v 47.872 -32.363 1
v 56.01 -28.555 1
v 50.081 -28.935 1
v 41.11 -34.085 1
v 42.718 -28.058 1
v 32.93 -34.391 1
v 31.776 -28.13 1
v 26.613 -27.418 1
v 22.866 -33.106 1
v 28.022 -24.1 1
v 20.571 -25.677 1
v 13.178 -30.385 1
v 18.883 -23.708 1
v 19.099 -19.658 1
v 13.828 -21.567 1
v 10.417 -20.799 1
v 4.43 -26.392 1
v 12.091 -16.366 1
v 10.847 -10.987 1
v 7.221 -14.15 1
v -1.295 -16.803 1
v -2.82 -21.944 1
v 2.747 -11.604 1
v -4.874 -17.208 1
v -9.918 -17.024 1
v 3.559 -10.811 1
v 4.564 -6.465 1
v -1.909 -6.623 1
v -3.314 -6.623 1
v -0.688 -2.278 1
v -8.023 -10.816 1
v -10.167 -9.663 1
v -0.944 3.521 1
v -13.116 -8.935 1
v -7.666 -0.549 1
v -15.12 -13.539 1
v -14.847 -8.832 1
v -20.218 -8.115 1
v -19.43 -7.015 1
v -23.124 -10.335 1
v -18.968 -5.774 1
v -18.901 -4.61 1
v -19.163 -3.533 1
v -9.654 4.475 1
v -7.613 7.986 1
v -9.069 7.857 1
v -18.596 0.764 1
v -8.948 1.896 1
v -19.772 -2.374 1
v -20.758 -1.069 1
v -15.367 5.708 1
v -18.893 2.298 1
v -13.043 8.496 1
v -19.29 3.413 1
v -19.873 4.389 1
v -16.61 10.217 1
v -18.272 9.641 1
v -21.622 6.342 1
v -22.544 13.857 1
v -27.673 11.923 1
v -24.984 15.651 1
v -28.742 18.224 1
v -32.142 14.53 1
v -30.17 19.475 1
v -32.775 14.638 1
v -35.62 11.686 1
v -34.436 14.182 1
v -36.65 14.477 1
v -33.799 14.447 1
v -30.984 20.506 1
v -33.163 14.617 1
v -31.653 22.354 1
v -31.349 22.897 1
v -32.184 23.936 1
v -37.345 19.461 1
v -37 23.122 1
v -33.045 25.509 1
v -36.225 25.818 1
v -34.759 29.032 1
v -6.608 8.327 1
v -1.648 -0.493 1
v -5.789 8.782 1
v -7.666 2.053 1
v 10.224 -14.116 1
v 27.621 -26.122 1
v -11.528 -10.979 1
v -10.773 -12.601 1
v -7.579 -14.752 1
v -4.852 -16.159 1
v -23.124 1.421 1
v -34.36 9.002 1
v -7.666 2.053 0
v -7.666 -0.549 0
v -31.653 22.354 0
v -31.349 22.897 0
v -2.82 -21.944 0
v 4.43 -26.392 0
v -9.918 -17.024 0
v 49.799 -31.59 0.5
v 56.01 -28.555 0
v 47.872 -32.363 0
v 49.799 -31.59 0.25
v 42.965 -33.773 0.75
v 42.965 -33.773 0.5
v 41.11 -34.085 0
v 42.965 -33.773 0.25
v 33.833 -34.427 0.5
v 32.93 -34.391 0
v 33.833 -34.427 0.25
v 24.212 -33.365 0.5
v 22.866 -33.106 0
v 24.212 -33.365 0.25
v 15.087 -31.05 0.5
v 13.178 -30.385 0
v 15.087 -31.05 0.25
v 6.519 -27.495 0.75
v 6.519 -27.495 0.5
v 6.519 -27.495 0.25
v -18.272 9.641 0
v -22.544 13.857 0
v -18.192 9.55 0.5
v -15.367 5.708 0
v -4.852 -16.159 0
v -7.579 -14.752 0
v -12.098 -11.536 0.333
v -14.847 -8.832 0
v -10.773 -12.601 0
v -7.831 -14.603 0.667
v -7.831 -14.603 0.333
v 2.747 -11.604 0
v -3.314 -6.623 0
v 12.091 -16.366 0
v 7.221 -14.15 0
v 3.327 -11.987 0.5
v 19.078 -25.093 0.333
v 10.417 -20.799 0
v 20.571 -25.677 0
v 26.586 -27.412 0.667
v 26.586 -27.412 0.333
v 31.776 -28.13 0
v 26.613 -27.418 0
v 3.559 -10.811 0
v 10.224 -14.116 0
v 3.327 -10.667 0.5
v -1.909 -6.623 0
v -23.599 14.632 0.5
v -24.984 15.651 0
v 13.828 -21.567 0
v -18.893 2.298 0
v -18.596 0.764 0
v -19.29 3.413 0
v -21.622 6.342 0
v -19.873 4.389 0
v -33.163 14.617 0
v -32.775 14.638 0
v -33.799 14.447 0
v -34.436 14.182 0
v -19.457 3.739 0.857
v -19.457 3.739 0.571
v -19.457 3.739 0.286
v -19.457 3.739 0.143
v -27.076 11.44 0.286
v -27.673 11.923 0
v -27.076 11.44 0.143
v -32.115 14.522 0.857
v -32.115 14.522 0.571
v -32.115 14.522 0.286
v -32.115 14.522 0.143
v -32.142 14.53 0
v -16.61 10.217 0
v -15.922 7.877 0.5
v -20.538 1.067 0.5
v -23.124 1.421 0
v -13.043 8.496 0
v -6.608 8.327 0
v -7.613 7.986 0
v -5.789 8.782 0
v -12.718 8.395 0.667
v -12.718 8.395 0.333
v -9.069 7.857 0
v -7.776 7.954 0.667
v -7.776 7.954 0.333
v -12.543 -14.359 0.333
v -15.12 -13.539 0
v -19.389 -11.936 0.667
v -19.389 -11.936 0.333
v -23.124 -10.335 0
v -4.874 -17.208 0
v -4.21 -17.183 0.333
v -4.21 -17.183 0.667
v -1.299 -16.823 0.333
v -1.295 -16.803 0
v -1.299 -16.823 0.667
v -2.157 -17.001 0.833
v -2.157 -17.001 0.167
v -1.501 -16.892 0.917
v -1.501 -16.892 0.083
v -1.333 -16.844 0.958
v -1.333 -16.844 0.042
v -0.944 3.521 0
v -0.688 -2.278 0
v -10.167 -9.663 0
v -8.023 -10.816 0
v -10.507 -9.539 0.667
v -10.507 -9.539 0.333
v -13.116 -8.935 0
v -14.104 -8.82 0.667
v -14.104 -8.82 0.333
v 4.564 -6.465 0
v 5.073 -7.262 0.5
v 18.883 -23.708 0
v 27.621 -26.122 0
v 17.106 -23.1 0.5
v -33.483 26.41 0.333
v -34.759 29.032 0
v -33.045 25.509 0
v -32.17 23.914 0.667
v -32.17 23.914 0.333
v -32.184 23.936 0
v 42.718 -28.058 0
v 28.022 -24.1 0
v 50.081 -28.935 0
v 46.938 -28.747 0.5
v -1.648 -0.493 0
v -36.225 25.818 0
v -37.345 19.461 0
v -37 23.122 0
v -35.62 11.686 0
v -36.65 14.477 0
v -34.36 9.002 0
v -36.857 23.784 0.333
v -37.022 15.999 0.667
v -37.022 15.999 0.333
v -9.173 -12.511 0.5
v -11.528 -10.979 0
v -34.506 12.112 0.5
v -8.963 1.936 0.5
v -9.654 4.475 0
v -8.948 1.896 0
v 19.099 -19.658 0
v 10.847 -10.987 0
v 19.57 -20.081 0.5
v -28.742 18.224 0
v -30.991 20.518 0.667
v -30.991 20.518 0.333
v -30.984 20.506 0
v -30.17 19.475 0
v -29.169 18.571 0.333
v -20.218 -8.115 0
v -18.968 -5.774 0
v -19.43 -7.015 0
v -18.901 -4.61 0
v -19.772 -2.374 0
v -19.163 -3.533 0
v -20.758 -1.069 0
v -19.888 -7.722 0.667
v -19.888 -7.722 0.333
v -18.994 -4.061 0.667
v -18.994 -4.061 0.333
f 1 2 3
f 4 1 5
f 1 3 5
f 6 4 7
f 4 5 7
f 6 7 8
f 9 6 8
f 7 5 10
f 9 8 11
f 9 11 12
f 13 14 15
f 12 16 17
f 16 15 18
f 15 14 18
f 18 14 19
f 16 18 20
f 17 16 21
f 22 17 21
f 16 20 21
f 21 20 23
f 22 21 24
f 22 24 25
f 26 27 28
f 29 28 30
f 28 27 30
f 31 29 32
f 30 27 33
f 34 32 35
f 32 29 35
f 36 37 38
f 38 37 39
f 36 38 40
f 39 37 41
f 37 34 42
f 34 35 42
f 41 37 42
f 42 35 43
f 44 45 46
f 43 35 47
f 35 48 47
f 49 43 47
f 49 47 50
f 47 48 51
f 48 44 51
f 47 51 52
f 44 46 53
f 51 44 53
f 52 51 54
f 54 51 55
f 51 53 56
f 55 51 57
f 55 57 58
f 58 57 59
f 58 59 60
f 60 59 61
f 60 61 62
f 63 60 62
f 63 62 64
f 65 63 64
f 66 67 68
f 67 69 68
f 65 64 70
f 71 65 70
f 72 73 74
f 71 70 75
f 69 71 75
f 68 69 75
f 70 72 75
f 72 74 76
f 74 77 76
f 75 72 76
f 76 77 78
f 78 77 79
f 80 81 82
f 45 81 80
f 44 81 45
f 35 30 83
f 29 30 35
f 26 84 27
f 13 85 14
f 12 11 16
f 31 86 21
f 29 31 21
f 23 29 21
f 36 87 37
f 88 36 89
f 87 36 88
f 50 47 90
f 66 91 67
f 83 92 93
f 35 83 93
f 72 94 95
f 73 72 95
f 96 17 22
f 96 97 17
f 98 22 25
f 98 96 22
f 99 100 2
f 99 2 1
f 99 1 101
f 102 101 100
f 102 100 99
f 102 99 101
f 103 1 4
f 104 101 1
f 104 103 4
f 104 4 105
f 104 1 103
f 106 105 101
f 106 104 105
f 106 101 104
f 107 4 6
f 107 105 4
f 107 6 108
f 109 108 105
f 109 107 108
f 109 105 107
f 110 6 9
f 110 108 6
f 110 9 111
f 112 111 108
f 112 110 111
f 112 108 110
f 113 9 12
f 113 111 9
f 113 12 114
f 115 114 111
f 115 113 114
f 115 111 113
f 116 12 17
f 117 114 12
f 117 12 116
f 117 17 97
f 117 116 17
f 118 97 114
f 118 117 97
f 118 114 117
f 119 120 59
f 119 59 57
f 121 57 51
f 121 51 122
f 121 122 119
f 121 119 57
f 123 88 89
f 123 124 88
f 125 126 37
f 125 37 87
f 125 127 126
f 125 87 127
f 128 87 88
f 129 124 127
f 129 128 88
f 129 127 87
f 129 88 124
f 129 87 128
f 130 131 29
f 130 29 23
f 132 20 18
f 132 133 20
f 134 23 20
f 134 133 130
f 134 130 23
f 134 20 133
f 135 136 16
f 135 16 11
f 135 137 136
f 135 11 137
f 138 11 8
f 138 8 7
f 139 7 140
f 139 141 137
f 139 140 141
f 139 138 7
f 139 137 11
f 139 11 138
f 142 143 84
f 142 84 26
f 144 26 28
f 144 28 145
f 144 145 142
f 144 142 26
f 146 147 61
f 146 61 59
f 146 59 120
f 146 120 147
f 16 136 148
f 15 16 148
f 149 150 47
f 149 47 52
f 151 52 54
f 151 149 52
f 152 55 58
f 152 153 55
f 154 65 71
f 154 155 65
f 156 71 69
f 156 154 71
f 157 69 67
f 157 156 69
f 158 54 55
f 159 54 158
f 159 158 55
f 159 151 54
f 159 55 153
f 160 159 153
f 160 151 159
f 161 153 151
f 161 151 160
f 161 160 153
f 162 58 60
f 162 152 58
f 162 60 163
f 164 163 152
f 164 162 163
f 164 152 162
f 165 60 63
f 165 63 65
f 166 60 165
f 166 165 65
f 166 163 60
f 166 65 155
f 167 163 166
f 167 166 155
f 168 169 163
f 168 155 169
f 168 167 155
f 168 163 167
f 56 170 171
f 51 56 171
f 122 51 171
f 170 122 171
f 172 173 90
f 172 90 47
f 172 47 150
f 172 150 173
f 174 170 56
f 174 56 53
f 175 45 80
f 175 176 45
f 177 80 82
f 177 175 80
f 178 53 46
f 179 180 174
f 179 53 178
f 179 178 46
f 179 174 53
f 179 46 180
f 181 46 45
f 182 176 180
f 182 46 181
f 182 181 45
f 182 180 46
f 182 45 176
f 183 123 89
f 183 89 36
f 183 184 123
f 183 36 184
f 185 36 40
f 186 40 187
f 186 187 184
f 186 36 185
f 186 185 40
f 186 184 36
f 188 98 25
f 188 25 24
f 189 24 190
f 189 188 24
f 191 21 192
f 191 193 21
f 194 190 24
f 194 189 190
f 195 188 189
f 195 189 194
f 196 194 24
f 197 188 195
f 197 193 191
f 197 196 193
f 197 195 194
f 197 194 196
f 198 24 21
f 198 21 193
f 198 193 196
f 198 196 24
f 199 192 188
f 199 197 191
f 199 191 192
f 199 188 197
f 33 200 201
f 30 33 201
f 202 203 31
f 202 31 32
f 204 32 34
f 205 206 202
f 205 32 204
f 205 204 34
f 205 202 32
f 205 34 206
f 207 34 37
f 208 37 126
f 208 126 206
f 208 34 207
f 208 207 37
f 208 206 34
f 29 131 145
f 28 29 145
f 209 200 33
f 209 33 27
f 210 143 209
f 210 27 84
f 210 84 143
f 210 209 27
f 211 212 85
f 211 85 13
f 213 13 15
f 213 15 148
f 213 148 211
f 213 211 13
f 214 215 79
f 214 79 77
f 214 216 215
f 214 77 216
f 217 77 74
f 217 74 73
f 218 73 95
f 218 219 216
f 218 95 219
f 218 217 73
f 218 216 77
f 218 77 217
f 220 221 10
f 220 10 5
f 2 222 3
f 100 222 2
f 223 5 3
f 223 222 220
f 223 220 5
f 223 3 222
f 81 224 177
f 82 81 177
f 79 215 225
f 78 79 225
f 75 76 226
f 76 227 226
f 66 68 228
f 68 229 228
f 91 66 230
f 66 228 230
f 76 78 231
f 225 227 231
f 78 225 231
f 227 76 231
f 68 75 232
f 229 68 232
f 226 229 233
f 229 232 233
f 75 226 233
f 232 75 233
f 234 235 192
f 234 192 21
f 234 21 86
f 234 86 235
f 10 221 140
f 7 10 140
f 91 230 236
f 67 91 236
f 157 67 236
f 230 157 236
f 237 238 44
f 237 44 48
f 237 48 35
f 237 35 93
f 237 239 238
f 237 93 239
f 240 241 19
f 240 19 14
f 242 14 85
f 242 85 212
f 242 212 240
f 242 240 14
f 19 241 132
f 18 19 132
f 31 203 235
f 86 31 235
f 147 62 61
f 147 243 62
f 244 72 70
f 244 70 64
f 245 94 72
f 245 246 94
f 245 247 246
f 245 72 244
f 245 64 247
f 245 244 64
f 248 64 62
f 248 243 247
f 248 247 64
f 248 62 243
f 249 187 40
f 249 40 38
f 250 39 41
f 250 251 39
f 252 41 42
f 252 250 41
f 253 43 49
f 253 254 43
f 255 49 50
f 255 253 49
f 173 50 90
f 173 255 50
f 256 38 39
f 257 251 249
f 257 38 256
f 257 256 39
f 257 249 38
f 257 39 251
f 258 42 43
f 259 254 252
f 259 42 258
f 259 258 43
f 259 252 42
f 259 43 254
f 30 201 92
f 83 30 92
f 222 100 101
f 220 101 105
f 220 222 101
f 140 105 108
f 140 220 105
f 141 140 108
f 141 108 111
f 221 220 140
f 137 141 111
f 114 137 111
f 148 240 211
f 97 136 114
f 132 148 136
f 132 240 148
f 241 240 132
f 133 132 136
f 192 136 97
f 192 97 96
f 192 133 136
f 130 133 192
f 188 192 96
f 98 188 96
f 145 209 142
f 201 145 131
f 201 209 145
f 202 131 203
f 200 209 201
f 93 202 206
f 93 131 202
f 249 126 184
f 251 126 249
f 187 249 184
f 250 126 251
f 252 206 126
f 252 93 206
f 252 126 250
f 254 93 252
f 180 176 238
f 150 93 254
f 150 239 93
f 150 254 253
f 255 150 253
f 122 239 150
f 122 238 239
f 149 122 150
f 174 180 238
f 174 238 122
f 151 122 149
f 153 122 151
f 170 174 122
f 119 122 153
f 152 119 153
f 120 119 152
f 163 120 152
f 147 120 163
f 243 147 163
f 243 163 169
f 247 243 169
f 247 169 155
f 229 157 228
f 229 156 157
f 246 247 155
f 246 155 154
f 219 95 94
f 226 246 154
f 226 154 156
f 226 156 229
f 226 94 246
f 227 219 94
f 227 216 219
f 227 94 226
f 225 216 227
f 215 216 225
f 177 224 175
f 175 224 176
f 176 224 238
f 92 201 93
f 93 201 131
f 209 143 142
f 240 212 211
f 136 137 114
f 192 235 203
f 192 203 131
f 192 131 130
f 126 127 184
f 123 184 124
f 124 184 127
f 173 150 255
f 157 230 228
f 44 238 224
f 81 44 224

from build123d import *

# Parameters (mm, degrees)
F1_DEPTH = 1


# Not quite as in the source:
# - a feature names something its author has since deleted; it is built from what else it names


with BuildPart() as f1:
    # F0 (on Top) → F1 (new body)
    with BuildSketch(Plane.XY):
        with BuildLine():
            add(Edge.make_bspline(
                [(-16.6099965572, 10.2172633633), (-15.4212118205, 9.5285409053), (-12.9551826674, 8.0998468723), (-7.766656534, 7.5933629956), (-6.3511176621, 8.4439850217), (-5.7889274321, 8.7818149477)],
                knots=[0, 0, 0, 0, 0.3594226743, 0.7455906573, 1, 1, 1, 1], degree=3))
            add(Edge.make_bspline(
                [(-16.6099965572, 10.2172633633), (-16.3713958805, 9.4307097449), (-15.904194945, 7.8905691575), (-15.5435341339, 6.4249386215), (-15.3670636937, 5.7078092359)],
                knots=[0, 0, 0, 0, 0.5107024806, 1, 1, 1, 1], degree=3))
            add(Edge.make_bspline(
                [(-22.5439389952, 13.8567826848), (-20.9328268461, 12.3755889493), (-17.8750260099, 9.497072632), (-16.1981091624, 6.9589873468), (-15.3670636937, 5.7078092359)],
                knots=[0.1092468408, 0.1092468408, 0.1092468408, 0.1092468408, 0.5599397099, 1, 1, 1, 1], degree=3))
            add(Edge.make_bspline(
                [(-24.9835465397, 15.6512659715), (-24.5105414607, 15.2932659882), (-23.6115055046, 14.644329683), (-22.8821580713, 14.1081462449), (-22.5439389952, 13.8567826848)],
                knots=[0, 0, 0, 0, 0.5340013105, 1, 1, 1, 1], degree=3))
            add(Edge.make_bspline(
                [(-31.6534787416, 22.3535578698), (-31.4894436188, 21.7239753561), (-31.1336922454, 20.3585675093), (-29.1441485457, 18.4393483759), (-26.688509429, 16.66011353), (-24.9835465397, 15.6512659715)],
                knots=[0, 0, 0, 0, 0.1581489893, 0.342985814, 0.5895394489, 0.5895394489, 0.5895394489, 0.5895394489], degree=3))
            Line((-31.6534787416, 22.3535578698), (-31.3492268324, 22.8967126459))
            add(Edge.make_bspline(
                [(-34.7586423159, 29.0321223438), (-34.3418990536, 28.1776650529), (-33.5153831208, 26.4830424187), (-32.2770591236, 23.9047003589), (-31.6167279276, 23.1873231579), (-31.3492268324, 22.8967126459)],
                knots=[0, 0, 0, 0, 0.3769541602, 0.747603255, 1, 1, 1, 1], degree=3))
            add(Edge.make_bspline(
                [(-34.7586423159, 29.0321223438), (-35.5677944518, 27.4079633385), (-37.3288786405, 23.8782557478), (-37.627728367, 15.760880925), (-35.454224769, 11.2387606607), (-34.3599178116, 9.002301842)],
                knots=[0, 0, 0, 0, 0.3007790413, 0.6538294353, 1, 1, 1, 1], degree=3))
            add(Edge.make_bspline(
                [(-34.3599178116, 9.002301842), (-34.4460411955, 10.0396901503), (-34.5463298451, 11.768741471), (-34.4792390008, 13.4920788706), (-34.4357995181, 14.1820461029)],
                knots=[0, 0, 0, 0, 0.5004169403, 0.8340605609, 0.8340605609, 0.8340605609, 0.8340605609], degree=3))
            add(Edge.make_bspline(
                [(-18.5956805944, 0.7639901596), (-18.754914474, 1.762296212), (-19.1182465354, 4.0401820297), (-22.8890828074, 7.5134991963), (-26.9671489576, 11.505197563), (-29.4215545254, 13.182958406), (-32.0236221513, 14.6651885876), (-33.3319524476, 14.6676349212), (-34.0719301846, 14.3425994686), (-34.4357995181, 14.1820461029)],
                knots=[0, 0, 0, 0, 0.1460617246, 0.3332764838, 0.5324015784, 0.6782952182, 0.8179917645, 0.9100820113, 0.9991741954, 0.9991741954, 0.9991741954, 0.9991741954], degree=3))
            add(Edge.make_bspline(
                [(-23.1238305569, 1.4212612296), (-22.2308115866, 1.302547656), (-20.5628255796, 1.0808137554), (-19.2197091749, 0.8644946878), (-18.5956805944, 0.7639901596)],
                knots=[0, 0, 0, 0, 0.5353875671, 1, 1, 1, 1], degree=3))
            add(Edge.make_bspline(
                [(-23.1238305569, -10.3354090825), (-21.9181343668, -9.5672404628), (-19.5647077627, -8.0678341604), (-18.0730916869, -3.6305347437), (-21.2811829424, -0.4217720451), (-23.1238305569, 1.4212612296)],
                knots=[0, 0, 0, 0, 0.3089727792, 0.603091197, 1, 1, 1, 1], degree=3))
            add(Edge.make_bspline(
                [(-4.8519154079, -16.1593034863), (-7.4154305721, -15.6333116353), (-12.4370011009, -14.6029665784), (-19.2999839188, -12.0288214544), (-21.9779293524, -10.8428779902), (-23.1238305569, -10.3354090825)],
                knots=[0, 0, 0, 0, 0.3736855161, 0.7319980787, 1, 1, 1, 1], degree=3))
            add(Edge.make_bspline(
                [(-14.8473009467, -8.831509389), (-14.0171136981, -9.7171202904), (-12.2176917006, -11.6366724638), (-7.9071133303, -14.7016545165), (-5.7918028227, -15.7108788812), (-4.8519154079, -16.1593034863)],
                knots=[0, 0, 0, 0, 0.322473213, 0.6989572463, 1, 1, 1, 1], degree=3))
            add(Edge.make_bspline(
                [(-8.0227525905, -10.816199705), (-8.7445347825, -10.3543101709), (-10.2936553467, -9.3629826161), (-14.0342744282, -8.7559960985), (-14.6547502449, -8.8136254249), (-14.8473009467, -8.831509389)],
                knots=[0, 0, 0, 0, 0.3756557433, 0.806248815, 1, 1, 1, 1], degree=3))
            Line((-8.0227525905, -10.816199705), (-11.5278782323, -10.9786894172))
            add(Edge.make_bspline(
                [(-1.2948540742, -16.8027080712), (-4.3131749279, -15.2063237418), (-9.020596995, -12.7165640866), (-10.8657693402, -11.4376176997), (-11.5278782323, -10.9786894172)],
                knots=[4.22789e-05, 4.22789e-05, 4.22789e-05, 4.22789e-05, 0.6411820822, 1, 1, 1, 1], degree=3))
            add(Edge.make_bspline(
                [(-9.9178981036, -17.0243084431), (-8.0369774486, -17.152822121), (-4.8078227744, -17.3734537264), (-1.2910580124, -16.912451153), (-1.2927963607, -16.8091016917), (-1.2948540742, -16.8027080712)],
                knots=[0, 0, 0, 0, 0.5593319314, 0.960258114, 0.9872401448, 0.9872401448, 0.9872401448, 0.9872401448], degree=3))
            add(Edge.make_bspline(
                [(56.0104735196, -28.554501012), (51.9388012895, -30.6732939687), (43.1626287248, -35.2401872663), (23.7757696907, -34.1342565116), (6.1000439104, -28.3431760834), (-4.5392052922, -20.825090838), (-9.9178981036, -17.0243084431)],
                knots=[0, 0, 0, 0, 0.2229662615, 0.4805864215, 0.7374094706, 1, 1, 1, 1], degree=3))
            add(Edge.make_bspline(
                [(28.0218664557, -24.0996014327), (34.8843220952, -26.1370758676), (46.4307325782, -29.5652242463), (53.2458361821, -28.8461877297), (56.0104735196, -28.554501012)],
                knots=[0, 0, 0, 0, 0.5943367118, 1, 1, 1, 1], degree=3))
            Line((28.0218664557, -24.0996014327), (31.7761152983, -28.129896149))
            add(Edge.make_bspline(
                [(10.4167964309, -20.7992941141), (13.3020900166, -22.350921559), (18.7887841643, -25.301506991), (26.4258501352, -27.584558387), (30.1169773998, -27.9607848021), (31.7761152983, -28.129896149)],
                knots=[0, 0, 0, 0, 0.3791070825, 0.7209126382, 1, 1, 1, 1], degree=3))
            Line((10.4167964309, -20.7992941141), (13.8279302046, -21.5669311583))
            add(Edge.make_bspline(
                [(27.6213772595, -26.1221751571), (23.6067244924, -25.076781429), (17.2832552929, -23.4301844692), (14.7521015867, -22.0652823535), (13.8279302046, -21.5669311583)],
                knots=[0, 0, 0, 0, 0.6348813666, 1, 1, 1, 1], degree=3))
            add(Edge.make_bspline(
                [(10.8465477824, -10.9871085733), (13.7292478088, -14.2236435187), (19.1884297009, -20.3529087233), (24.9175139429, -24.2723702383), (27.6213772595, -26.1221751571)],
                knots=[0, 0, 0, 0, 0.5280461584, 1, 1, 1, 1], degree=3))
            Line((10.8465477824, -10.9871085733), (12.0913498104, -16.3664314896))
            add(Edge.make_bspline(
                [(-3.3141928725, -6.6230124794), (-1.2243299559, -8.513743245), (3.1043671989, -12.4299813966), (9.0277383612, -15.0245179581), (12.0913498104, -16.3664314896)],
                knots=[0, 0, 0, 0, 0.4827925914, 1, 1, 1, 1], degree=3))
            Line((-3.3141928725, -6.6230124794), (-1.909304643, -6.6230124794))
            add(Edge.make_bspline(
                [(10.2238217369, -14.115748927), (7.8172960071, -13.0456945157), (3.181551384, -10.9844246435), (-0.2561811543, -8.0392679882), (-1.909304643, -6.6230124794)],
                knots=[0, 0, 0, 0, 0.5191238788, 1, 1, 1, 1], degree=3))
            add(Edge.make_bspline(
                [(-0.9440209251, 3.5210286733), (1.0464920899, -0.3056682218), (4.6957007503, -7.3211538505), (8.4963093931, -11.9924692639), (10.2238217369, -14.115748927)],
                knots=[0, 0, 0, 0, 0.5454642911, 1, 1, 1, 1], degree=3))
            Line((-0.9440209251, 3.5210286733), (-0.6881441002, -2.2778437083))
            Line((-0.6881441002, -2.2778437083), (-7.6660518534, 2.0532717463))
            Line((-7.6660518534, 2.0532717463), (-7.6660518534, -0.5485964357))
            add(Edge.make_bspline(
                [(-9.6535952762, 4.4754715636), (-9.4700688508, 3.6180804257), (-9.0971451505, 1.8758709595), (-8.1480633424, 0.2679968231), (-7.6660518534, -0.5485964357)],
                knots=[0, 0, 0, 0, 0.4921286186, 1, 1, 1, 1], degree=3))
            Line((-9.6535952762, 4.4754715636), (-1.648212783, -0.4933868768))
            Line((-1.648212783, -0.4933868768), (-5.7889274321, 8.7818149477))
        make_face()
    extrude(amount=F1_DEPTH)


solid = f1.part
